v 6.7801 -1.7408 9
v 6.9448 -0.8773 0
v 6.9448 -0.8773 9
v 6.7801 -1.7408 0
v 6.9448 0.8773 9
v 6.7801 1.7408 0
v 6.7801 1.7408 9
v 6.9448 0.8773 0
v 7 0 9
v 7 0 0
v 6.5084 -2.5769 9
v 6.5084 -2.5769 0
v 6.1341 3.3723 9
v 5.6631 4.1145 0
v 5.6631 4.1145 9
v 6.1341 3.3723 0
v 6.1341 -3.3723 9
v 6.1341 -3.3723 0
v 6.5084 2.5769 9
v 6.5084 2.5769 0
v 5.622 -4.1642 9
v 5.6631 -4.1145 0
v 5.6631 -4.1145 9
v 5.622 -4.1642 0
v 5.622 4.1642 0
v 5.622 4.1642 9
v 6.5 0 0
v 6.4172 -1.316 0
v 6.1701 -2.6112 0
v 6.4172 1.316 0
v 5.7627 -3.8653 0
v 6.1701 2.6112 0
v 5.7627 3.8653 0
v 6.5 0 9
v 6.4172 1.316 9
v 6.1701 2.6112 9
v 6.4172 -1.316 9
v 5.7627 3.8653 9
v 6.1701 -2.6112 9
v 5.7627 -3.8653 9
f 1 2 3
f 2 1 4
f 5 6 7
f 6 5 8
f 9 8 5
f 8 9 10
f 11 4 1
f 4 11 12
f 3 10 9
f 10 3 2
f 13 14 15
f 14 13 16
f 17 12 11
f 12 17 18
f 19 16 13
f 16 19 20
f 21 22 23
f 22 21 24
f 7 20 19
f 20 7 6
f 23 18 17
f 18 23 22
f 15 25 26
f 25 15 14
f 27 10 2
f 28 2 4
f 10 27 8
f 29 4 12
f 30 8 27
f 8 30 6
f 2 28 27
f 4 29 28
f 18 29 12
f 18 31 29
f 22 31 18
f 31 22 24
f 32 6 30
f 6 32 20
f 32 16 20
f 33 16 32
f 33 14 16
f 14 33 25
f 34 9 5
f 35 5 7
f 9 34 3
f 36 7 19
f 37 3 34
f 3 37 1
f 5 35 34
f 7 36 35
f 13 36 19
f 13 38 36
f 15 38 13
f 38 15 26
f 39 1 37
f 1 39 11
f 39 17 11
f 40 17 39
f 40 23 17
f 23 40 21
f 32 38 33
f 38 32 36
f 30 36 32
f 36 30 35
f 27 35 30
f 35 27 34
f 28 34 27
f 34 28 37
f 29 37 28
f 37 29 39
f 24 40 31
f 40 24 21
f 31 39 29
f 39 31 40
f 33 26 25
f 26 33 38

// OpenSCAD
$fn = 50;


difference() {
	union() {
		cylinder(h = 9, r = 7.0000000000);
		translate(v = [-7.0000000000, 0, 0]) {
			cylinder(h = 9, r = 7.0000000000);
		}
	}
	union() {
		cylinder(h = 9, r = 3.2500000000);
		cylinder(h = 9, r = 1.8000000000);
		cylinder(h = 9, r = 1.8000000000);
		cylinder(h = 9, r = 1.8000000000);
		translate(v = [-11.5000000000, 0, 0]) {
			hull() {
				translate(v = [-3.7500000000, 0.0000000000, 0]) {
					cylinder(h = 9, r = 7.5000000000);
				}
				translate(v = [3.7500000000, 0.0000000000, 0]) {
					cylinder(h = 9, r = 7.5000000000);
				}
				translate(v = [-3.7500000000, -0.0000000000, 0]) {
					cylinder(h = 9, r = 7.5000000000);
				}
				translate(v = [3.7500000000, -0.0000000000, 0]) {
					cylinder(h = 9, r = 7.5000000000);
				}
			}
		}
		translate(v = [-4.0000000000, 0, 0.0000000000]) {
			cylinder(h = 9, r = 10.5000000000);
		}
	}
}
